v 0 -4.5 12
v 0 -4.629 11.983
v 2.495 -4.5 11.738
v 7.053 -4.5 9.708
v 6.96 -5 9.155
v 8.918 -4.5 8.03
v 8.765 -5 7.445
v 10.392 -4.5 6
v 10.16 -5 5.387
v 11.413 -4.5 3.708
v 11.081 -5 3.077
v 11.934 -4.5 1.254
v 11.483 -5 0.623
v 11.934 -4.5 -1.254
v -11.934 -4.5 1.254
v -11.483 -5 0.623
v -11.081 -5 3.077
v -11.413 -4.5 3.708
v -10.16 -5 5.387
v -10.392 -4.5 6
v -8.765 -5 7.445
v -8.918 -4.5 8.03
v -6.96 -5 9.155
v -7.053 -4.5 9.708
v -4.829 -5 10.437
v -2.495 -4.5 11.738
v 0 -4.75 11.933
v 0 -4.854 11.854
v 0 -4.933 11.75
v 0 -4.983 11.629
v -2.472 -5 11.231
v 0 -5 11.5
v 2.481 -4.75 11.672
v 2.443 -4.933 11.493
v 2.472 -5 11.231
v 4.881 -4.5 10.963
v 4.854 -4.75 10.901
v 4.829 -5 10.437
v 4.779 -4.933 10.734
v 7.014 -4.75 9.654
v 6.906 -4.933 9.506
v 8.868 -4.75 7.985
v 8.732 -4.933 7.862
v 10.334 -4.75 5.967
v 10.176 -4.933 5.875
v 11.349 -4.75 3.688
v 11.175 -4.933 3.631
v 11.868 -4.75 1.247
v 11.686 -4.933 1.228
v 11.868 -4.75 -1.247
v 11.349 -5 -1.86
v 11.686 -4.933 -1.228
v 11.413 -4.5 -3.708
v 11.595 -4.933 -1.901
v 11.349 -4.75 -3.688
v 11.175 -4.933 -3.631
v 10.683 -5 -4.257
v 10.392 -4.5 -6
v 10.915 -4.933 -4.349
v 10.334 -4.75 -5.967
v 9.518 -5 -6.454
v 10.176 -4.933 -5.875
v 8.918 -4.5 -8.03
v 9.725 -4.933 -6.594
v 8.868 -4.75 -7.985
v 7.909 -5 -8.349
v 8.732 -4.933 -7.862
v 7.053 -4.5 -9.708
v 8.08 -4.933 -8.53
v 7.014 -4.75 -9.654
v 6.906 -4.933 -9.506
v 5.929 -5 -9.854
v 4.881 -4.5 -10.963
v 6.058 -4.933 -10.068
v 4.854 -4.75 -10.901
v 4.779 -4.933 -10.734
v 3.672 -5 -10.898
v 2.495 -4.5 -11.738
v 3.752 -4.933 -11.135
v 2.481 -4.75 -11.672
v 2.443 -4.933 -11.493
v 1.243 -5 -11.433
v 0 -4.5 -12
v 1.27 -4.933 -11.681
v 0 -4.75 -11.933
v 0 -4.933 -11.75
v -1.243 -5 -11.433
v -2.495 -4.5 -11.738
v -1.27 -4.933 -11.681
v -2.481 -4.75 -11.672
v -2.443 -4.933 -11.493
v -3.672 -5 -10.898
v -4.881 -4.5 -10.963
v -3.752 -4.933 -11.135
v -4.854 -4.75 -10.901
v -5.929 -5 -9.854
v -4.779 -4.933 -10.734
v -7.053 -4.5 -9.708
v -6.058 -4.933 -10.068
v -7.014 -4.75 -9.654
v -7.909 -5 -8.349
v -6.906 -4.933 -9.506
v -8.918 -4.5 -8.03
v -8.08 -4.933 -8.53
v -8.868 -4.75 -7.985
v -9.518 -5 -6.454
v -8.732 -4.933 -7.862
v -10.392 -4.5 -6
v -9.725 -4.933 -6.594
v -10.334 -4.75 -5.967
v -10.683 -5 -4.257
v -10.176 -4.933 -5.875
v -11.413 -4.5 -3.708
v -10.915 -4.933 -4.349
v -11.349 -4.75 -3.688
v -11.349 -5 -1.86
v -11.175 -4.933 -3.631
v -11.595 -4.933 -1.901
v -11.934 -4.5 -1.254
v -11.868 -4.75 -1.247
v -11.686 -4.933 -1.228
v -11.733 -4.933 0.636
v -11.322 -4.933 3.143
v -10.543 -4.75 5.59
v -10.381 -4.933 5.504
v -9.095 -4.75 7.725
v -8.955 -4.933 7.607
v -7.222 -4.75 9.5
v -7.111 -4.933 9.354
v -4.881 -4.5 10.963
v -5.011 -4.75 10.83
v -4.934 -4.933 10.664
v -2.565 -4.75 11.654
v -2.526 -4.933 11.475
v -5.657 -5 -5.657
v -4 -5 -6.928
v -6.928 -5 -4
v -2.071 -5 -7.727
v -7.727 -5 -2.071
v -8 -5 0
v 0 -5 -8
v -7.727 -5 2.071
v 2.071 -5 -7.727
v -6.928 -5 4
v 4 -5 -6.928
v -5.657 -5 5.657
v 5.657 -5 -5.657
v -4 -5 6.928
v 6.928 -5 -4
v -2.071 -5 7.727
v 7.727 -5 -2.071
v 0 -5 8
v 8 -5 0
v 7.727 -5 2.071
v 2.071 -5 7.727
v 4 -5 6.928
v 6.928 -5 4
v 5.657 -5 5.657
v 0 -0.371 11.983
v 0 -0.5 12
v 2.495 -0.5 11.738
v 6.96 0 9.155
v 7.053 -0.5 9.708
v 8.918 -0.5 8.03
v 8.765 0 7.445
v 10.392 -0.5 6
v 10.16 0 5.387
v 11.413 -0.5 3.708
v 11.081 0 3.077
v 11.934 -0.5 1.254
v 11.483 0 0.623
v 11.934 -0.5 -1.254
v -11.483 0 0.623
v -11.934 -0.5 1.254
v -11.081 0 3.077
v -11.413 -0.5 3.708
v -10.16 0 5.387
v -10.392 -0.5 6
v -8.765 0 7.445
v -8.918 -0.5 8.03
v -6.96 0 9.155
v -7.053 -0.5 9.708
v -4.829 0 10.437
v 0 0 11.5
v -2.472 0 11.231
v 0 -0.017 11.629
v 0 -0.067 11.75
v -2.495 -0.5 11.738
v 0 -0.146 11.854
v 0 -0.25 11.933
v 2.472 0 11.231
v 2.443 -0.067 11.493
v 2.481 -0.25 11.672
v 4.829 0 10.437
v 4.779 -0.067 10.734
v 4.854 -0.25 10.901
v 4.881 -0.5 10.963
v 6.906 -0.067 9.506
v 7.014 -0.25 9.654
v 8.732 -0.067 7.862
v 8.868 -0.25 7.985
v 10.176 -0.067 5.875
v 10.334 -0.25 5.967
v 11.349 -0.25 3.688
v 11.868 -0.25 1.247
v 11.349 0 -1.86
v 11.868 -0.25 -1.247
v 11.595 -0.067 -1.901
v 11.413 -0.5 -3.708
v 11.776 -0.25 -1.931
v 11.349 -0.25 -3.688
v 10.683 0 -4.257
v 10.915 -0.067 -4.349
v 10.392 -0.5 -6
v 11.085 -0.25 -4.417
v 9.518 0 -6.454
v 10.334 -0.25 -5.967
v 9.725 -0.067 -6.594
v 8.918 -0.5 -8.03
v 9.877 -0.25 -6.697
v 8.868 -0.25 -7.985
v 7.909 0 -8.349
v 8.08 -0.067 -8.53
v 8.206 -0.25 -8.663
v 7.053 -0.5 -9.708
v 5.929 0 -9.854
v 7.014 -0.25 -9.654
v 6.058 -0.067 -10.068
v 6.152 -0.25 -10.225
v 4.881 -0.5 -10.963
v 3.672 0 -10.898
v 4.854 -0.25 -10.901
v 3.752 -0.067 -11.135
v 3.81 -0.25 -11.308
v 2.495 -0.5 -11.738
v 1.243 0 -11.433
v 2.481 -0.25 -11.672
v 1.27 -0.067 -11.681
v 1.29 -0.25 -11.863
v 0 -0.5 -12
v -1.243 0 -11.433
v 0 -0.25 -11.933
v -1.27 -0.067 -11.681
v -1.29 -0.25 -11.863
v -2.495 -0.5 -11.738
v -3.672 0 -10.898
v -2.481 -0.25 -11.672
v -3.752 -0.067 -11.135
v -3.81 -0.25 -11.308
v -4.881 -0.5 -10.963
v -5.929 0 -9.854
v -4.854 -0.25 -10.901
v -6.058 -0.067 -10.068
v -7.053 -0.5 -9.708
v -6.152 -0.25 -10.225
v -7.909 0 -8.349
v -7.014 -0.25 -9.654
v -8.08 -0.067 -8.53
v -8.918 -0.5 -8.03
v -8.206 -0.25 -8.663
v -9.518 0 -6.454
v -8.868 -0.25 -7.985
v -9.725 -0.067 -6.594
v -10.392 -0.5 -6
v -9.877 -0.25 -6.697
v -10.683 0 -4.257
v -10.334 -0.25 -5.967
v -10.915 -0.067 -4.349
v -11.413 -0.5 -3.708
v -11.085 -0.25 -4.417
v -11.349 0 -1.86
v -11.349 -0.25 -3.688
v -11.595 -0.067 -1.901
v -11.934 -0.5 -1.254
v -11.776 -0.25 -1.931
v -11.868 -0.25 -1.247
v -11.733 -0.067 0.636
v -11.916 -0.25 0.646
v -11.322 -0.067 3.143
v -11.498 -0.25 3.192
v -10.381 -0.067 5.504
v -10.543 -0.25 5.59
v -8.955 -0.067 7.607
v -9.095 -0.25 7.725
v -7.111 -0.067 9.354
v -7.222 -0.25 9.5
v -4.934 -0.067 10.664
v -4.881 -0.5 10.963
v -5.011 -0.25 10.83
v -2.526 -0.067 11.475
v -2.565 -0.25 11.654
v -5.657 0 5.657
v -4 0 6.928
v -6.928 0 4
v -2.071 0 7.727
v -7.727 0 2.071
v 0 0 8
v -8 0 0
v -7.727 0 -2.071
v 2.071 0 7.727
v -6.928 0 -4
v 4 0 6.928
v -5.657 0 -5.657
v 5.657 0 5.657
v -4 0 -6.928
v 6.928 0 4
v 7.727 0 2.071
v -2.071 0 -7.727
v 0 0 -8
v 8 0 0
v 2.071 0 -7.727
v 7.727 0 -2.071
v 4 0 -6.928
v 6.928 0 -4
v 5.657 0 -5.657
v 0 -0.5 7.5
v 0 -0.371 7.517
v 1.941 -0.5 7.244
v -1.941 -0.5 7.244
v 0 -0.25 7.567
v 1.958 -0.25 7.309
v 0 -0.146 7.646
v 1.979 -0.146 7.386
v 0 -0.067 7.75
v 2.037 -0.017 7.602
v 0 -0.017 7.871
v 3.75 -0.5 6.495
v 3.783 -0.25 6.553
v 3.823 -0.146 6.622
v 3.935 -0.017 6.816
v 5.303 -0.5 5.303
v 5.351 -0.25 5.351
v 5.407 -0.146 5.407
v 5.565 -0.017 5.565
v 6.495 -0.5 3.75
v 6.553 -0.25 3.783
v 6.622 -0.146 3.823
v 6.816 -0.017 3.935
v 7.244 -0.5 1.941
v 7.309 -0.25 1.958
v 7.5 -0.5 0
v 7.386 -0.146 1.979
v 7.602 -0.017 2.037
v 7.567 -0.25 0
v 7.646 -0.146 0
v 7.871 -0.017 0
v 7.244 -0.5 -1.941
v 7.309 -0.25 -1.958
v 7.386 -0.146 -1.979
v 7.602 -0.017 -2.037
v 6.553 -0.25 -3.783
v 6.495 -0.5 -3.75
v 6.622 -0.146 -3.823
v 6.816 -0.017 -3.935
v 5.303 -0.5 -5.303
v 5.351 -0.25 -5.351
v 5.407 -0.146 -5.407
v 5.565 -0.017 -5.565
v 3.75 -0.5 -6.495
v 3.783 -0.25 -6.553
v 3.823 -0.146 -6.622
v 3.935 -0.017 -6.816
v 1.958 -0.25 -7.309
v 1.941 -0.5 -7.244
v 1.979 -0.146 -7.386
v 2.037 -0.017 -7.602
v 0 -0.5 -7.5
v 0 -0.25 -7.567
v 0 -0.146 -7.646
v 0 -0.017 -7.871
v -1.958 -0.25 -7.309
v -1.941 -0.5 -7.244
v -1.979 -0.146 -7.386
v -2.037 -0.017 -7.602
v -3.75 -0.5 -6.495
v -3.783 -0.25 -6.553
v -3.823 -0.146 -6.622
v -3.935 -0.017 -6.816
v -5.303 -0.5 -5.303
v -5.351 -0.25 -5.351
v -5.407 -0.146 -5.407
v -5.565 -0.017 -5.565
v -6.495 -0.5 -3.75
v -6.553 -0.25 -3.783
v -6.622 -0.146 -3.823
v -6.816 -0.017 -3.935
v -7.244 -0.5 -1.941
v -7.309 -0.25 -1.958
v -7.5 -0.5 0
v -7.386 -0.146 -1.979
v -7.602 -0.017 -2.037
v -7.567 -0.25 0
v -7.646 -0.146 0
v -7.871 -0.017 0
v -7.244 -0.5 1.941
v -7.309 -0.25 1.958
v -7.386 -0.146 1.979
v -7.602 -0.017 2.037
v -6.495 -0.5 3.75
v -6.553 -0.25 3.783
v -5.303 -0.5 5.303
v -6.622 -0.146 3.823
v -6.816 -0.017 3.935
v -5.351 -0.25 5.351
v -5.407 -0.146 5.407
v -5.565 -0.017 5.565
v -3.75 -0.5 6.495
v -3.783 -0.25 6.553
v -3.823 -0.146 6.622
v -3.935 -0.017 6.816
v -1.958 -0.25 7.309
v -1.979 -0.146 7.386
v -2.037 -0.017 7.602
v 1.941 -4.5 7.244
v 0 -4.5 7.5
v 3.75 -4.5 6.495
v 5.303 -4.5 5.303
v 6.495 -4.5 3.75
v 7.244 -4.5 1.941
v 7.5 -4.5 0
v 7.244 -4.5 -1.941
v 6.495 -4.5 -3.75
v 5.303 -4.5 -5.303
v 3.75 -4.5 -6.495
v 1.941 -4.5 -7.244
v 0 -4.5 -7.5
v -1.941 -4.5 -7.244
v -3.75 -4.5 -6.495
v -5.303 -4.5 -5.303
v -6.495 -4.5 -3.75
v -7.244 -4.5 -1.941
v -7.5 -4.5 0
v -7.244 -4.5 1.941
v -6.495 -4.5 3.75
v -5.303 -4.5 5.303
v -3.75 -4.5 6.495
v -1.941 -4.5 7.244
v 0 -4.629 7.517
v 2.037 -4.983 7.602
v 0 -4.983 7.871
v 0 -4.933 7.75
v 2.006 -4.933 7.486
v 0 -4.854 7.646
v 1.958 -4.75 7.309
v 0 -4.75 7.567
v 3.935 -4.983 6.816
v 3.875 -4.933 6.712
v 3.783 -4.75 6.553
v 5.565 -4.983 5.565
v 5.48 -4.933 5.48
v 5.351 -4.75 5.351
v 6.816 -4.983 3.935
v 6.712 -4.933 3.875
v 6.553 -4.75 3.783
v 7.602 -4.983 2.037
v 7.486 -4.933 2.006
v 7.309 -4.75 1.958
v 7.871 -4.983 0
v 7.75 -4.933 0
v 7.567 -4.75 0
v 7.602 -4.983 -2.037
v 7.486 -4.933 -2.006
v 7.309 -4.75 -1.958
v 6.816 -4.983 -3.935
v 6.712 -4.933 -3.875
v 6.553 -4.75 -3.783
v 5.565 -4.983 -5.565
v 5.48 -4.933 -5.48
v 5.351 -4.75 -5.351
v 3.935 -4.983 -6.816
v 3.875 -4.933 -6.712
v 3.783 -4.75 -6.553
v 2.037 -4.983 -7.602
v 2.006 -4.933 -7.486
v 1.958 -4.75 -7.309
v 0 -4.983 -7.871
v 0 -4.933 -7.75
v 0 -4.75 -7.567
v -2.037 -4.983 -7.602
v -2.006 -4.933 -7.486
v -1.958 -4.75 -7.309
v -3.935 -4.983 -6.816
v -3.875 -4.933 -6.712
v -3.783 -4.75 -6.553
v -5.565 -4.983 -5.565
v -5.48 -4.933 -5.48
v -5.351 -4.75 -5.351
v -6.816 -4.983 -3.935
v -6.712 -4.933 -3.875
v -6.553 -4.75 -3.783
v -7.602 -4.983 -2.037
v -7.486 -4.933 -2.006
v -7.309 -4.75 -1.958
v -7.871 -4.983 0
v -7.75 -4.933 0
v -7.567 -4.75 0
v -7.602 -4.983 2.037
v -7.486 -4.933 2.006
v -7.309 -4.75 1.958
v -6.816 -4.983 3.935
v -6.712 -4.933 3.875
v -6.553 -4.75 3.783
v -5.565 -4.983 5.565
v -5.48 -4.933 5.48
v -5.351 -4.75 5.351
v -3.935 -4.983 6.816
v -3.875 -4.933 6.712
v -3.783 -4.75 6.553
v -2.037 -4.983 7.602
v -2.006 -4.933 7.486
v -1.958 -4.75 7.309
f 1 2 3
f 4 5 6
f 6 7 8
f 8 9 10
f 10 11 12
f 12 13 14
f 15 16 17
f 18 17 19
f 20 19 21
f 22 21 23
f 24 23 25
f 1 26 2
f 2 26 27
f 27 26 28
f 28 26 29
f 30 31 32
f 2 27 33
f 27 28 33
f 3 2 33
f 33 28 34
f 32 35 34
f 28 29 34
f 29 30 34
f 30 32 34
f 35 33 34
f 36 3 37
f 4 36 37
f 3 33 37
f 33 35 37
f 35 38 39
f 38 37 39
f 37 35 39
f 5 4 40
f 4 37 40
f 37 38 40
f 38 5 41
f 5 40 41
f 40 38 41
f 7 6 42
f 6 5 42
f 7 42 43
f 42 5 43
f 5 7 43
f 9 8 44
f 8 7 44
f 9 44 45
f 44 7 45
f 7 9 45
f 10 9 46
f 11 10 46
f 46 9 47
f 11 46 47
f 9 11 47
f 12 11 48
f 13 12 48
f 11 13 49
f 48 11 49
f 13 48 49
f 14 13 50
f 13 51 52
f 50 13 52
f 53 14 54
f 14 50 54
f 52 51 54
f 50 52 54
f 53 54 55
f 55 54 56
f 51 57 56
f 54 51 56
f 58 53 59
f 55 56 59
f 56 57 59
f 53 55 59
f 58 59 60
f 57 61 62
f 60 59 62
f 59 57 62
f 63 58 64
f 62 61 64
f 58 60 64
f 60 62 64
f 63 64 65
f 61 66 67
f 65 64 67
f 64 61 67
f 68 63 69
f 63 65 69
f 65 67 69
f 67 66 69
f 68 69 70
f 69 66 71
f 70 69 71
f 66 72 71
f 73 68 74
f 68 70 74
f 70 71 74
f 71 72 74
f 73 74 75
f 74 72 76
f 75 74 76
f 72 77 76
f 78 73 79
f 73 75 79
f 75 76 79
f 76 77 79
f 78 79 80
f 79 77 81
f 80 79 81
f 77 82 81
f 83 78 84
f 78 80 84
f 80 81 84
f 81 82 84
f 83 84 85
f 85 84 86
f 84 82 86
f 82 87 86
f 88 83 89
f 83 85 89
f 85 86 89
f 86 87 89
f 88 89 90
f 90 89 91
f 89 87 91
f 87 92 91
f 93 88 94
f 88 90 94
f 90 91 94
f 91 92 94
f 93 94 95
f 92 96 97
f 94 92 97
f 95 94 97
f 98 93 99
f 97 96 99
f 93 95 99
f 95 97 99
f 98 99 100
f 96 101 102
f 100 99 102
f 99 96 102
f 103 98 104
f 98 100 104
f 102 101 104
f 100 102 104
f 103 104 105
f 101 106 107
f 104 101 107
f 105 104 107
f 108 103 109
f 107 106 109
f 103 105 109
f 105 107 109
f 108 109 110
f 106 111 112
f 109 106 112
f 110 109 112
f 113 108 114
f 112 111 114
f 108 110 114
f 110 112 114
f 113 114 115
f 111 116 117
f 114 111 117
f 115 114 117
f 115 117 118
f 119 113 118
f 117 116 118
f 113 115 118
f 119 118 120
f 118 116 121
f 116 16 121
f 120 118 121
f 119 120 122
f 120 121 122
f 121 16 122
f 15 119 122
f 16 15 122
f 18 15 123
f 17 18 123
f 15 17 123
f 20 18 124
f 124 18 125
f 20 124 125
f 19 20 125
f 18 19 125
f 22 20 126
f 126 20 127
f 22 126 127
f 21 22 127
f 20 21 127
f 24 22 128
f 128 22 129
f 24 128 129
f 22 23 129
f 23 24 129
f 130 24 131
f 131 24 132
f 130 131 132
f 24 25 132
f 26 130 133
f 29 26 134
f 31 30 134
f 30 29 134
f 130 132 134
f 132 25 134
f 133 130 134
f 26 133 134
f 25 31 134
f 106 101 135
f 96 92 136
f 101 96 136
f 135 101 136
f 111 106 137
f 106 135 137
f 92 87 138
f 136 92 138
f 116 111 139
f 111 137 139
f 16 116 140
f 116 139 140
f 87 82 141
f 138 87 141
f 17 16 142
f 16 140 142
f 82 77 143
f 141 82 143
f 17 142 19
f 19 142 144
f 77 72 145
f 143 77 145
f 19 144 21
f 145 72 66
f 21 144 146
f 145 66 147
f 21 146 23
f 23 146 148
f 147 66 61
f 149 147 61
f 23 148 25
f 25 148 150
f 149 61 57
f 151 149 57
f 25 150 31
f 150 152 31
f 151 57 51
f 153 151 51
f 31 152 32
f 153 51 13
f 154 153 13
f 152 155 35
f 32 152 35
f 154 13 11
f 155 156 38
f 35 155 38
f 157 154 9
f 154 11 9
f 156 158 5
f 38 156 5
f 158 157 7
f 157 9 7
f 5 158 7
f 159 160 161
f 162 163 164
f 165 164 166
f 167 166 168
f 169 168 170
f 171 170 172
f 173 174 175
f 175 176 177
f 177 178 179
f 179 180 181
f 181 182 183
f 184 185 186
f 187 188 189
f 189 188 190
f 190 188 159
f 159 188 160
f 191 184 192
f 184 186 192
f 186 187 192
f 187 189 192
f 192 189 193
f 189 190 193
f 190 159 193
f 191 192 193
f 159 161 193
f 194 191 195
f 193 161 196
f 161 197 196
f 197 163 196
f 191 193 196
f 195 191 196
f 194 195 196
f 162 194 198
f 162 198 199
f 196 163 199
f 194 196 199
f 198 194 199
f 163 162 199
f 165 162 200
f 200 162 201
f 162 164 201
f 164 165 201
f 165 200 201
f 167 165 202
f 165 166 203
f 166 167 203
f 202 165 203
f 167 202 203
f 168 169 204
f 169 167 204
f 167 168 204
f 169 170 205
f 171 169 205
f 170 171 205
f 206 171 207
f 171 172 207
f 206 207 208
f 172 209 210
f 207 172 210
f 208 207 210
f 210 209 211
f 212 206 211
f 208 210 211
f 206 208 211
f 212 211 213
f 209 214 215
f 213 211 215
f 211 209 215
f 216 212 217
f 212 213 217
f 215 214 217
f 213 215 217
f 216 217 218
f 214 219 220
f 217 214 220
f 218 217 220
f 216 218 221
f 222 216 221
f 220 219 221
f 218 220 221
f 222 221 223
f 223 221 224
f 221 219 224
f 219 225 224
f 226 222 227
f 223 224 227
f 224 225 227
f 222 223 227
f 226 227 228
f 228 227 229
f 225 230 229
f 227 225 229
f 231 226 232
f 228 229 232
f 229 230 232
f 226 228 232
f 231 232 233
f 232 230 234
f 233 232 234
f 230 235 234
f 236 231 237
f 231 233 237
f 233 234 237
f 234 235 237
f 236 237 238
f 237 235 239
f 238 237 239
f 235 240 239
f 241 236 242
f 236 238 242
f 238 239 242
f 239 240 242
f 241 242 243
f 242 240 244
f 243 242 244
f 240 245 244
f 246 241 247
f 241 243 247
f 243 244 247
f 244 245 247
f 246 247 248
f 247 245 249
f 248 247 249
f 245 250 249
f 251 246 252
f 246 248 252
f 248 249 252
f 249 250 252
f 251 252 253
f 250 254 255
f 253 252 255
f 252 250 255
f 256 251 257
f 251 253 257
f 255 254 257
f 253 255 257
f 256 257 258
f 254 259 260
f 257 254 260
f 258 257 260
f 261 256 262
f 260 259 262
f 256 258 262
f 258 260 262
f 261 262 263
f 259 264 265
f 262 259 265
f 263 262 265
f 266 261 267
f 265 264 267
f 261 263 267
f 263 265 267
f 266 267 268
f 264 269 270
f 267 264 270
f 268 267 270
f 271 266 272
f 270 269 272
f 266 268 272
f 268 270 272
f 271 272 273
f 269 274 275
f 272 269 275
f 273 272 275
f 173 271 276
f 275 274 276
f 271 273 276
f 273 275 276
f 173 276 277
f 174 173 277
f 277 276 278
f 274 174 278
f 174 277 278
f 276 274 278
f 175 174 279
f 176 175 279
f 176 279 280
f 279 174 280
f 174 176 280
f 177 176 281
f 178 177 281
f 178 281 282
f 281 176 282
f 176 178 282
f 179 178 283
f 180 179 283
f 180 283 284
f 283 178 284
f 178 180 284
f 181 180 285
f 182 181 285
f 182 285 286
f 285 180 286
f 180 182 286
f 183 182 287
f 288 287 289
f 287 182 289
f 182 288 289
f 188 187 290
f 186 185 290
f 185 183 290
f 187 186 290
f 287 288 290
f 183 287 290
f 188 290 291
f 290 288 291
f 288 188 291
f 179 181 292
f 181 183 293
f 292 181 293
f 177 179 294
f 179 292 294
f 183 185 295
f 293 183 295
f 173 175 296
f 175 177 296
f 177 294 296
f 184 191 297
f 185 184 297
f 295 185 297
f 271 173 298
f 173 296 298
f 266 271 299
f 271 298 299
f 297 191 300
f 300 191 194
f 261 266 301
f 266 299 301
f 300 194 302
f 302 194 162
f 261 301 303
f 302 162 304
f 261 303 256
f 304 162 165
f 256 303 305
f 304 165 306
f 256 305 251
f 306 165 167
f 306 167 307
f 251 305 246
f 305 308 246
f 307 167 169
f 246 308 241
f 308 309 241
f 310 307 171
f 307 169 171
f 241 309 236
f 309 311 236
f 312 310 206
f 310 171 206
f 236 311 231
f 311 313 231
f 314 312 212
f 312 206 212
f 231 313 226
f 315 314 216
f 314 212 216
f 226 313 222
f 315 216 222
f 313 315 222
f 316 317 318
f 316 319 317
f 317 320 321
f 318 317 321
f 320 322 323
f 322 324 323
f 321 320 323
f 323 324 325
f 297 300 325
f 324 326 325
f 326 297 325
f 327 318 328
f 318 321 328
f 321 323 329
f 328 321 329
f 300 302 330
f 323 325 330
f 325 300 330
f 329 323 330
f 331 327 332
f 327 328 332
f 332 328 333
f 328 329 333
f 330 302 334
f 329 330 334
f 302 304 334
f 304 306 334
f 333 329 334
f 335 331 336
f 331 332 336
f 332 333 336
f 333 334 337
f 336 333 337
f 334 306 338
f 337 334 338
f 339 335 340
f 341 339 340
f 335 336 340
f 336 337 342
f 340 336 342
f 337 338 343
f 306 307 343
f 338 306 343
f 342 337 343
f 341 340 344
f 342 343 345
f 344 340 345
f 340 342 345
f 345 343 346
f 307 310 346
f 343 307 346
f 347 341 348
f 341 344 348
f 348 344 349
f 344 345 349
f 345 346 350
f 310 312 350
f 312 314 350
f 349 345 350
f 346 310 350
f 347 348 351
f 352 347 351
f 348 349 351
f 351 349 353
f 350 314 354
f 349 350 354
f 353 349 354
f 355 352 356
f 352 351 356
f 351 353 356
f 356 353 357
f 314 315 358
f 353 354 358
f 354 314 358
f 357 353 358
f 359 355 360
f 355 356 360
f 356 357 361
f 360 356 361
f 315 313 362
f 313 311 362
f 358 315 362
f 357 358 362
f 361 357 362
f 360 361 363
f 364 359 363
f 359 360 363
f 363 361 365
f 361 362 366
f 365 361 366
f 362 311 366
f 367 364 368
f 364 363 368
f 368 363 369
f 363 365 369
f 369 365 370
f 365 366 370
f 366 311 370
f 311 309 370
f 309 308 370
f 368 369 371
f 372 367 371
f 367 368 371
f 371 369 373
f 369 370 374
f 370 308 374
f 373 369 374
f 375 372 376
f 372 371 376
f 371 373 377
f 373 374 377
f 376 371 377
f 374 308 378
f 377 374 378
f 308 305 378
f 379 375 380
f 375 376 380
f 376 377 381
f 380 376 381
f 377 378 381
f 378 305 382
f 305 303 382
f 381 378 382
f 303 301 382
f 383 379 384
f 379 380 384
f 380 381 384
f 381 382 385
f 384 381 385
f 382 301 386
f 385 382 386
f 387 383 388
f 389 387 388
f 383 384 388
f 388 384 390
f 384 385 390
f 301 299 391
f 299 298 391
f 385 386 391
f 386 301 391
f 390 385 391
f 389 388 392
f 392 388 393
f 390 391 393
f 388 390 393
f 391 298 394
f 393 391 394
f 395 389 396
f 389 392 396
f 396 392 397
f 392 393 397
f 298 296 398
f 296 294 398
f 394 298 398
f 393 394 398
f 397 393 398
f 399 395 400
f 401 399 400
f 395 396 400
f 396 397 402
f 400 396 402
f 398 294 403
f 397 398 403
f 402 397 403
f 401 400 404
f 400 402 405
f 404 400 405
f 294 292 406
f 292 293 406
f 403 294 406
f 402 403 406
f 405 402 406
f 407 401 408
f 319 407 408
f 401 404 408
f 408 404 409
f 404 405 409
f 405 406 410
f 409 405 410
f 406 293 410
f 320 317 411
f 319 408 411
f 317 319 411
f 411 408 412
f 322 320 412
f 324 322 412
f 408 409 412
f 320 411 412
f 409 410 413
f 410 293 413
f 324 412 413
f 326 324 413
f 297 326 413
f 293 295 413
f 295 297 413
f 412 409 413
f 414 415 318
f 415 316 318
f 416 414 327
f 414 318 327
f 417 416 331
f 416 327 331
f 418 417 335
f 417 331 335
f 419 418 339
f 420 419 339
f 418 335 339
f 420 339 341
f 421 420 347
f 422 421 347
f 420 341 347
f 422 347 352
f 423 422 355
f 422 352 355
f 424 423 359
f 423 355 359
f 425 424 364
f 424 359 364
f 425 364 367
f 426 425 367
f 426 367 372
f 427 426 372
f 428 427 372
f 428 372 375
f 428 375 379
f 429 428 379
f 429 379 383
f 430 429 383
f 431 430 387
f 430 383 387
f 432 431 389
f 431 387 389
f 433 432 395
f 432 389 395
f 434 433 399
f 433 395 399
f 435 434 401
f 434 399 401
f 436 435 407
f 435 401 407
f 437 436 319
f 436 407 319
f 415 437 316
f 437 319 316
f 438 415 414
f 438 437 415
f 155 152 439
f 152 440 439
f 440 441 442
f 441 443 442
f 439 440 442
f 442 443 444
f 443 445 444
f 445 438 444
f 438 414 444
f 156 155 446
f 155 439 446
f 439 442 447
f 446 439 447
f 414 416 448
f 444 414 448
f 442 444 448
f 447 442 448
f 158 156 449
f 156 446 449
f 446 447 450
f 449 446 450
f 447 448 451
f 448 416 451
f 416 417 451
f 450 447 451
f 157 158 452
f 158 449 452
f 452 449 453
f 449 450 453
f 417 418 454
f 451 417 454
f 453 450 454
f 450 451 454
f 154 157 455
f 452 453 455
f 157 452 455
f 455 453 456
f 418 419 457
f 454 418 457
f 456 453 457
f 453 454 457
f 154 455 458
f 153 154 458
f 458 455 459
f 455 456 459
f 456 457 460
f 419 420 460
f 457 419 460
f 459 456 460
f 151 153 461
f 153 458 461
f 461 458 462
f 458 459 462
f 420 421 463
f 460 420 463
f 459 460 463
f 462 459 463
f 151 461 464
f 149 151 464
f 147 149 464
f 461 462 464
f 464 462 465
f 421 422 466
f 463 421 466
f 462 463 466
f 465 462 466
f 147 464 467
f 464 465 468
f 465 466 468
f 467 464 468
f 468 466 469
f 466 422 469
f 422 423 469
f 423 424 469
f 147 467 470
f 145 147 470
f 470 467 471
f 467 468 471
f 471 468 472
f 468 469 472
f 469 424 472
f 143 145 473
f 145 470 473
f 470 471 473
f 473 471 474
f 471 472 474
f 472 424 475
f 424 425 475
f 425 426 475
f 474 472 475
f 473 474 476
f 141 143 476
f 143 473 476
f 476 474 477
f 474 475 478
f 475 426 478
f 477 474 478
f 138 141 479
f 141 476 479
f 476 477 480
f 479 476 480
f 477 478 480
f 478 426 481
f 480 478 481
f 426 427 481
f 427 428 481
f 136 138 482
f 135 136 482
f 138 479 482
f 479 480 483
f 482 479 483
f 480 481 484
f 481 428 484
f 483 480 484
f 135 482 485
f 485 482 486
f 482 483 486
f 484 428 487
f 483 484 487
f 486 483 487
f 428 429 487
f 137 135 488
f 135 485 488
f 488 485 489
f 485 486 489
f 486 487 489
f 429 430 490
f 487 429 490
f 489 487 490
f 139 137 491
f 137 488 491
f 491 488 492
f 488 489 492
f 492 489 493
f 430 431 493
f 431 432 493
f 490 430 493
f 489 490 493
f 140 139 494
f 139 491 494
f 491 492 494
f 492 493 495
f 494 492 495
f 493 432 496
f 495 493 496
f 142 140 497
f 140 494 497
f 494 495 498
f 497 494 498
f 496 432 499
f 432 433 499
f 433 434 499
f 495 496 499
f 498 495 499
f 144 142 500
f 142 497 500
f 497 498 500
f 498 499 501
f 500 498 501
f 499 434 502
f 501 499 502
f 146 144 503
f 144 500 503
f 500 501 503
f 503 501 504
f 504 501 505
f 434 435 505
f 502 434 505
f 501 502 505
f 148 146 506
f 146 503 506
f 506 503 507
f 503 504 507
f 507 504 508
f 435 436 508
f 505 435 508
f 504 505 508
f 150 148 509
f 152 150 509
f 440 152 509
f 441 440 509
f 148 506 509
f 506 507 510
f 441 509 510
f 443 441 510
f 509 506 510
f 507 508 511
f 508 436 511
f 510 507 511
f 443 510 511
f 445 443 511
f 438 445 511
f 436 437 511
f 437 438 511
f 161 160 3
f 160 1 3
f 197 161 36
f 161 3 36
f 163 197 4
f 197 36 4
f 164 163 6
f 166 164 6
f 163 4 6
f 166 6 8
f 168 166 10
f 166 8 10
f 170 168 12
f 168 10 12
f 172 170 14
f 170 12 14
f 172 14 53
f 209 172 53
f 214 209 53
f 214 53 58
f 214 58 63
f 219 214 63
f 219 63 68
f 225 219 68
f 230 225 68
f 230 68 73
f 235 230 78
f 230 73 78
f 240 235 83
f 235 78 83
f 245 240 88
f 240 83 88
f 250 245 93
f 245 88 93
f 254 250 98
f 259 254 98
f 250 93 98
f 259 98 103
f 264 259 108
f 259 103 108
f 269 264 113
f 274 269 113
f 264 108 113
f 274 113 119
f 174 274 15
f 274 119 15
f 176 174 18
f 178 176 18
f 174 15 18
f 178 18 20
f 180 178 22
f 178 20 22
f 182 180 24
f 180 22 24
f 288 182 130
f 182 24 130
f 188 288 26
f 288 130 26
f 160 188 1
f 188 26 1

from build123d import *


with BuildPart() as part:
    # Sketch1 → Revolve1 (revolve)
    with BuildSketch(Plane(origin=(0, 0, 0), x_dir=(-1, 0, 0), z_dir=(0, 0, -1)), mode=Mode.PRIVATE) as revolve1_sk:
        with BuildLine():
            Line((-12, -0.5), (-12, -4.5))
            ThreePointArc((-12, -4.5), (-11.853553391, -4.853553391), (-11.5, -5))
            Line((-11.5, -5), (-8, -5))
            ThreePointArc((-8, -5), (-7.646446609, -4.853553391), (-7.5, -4.5))
            Line((-7.5, -4.5), (-7.5, -0.5))
            ThreePointArc((-7.5, -0.5), (-7.646446609, -0.146446609), (-8, 0))
            Line((-8, 0), (-11.5, 0))
            ThreePointArc((-11.5, 0), (-11.853553391, -0.146446609), (-12, -0.5))
        make_face()
    revolve(revolve1_sk.sketch.rotate(Axis((0, -5, 0), (0, 1, 0)), 270), axis=Axis((0, -5, 0), (0, 1, 0)))


solid = part.part
